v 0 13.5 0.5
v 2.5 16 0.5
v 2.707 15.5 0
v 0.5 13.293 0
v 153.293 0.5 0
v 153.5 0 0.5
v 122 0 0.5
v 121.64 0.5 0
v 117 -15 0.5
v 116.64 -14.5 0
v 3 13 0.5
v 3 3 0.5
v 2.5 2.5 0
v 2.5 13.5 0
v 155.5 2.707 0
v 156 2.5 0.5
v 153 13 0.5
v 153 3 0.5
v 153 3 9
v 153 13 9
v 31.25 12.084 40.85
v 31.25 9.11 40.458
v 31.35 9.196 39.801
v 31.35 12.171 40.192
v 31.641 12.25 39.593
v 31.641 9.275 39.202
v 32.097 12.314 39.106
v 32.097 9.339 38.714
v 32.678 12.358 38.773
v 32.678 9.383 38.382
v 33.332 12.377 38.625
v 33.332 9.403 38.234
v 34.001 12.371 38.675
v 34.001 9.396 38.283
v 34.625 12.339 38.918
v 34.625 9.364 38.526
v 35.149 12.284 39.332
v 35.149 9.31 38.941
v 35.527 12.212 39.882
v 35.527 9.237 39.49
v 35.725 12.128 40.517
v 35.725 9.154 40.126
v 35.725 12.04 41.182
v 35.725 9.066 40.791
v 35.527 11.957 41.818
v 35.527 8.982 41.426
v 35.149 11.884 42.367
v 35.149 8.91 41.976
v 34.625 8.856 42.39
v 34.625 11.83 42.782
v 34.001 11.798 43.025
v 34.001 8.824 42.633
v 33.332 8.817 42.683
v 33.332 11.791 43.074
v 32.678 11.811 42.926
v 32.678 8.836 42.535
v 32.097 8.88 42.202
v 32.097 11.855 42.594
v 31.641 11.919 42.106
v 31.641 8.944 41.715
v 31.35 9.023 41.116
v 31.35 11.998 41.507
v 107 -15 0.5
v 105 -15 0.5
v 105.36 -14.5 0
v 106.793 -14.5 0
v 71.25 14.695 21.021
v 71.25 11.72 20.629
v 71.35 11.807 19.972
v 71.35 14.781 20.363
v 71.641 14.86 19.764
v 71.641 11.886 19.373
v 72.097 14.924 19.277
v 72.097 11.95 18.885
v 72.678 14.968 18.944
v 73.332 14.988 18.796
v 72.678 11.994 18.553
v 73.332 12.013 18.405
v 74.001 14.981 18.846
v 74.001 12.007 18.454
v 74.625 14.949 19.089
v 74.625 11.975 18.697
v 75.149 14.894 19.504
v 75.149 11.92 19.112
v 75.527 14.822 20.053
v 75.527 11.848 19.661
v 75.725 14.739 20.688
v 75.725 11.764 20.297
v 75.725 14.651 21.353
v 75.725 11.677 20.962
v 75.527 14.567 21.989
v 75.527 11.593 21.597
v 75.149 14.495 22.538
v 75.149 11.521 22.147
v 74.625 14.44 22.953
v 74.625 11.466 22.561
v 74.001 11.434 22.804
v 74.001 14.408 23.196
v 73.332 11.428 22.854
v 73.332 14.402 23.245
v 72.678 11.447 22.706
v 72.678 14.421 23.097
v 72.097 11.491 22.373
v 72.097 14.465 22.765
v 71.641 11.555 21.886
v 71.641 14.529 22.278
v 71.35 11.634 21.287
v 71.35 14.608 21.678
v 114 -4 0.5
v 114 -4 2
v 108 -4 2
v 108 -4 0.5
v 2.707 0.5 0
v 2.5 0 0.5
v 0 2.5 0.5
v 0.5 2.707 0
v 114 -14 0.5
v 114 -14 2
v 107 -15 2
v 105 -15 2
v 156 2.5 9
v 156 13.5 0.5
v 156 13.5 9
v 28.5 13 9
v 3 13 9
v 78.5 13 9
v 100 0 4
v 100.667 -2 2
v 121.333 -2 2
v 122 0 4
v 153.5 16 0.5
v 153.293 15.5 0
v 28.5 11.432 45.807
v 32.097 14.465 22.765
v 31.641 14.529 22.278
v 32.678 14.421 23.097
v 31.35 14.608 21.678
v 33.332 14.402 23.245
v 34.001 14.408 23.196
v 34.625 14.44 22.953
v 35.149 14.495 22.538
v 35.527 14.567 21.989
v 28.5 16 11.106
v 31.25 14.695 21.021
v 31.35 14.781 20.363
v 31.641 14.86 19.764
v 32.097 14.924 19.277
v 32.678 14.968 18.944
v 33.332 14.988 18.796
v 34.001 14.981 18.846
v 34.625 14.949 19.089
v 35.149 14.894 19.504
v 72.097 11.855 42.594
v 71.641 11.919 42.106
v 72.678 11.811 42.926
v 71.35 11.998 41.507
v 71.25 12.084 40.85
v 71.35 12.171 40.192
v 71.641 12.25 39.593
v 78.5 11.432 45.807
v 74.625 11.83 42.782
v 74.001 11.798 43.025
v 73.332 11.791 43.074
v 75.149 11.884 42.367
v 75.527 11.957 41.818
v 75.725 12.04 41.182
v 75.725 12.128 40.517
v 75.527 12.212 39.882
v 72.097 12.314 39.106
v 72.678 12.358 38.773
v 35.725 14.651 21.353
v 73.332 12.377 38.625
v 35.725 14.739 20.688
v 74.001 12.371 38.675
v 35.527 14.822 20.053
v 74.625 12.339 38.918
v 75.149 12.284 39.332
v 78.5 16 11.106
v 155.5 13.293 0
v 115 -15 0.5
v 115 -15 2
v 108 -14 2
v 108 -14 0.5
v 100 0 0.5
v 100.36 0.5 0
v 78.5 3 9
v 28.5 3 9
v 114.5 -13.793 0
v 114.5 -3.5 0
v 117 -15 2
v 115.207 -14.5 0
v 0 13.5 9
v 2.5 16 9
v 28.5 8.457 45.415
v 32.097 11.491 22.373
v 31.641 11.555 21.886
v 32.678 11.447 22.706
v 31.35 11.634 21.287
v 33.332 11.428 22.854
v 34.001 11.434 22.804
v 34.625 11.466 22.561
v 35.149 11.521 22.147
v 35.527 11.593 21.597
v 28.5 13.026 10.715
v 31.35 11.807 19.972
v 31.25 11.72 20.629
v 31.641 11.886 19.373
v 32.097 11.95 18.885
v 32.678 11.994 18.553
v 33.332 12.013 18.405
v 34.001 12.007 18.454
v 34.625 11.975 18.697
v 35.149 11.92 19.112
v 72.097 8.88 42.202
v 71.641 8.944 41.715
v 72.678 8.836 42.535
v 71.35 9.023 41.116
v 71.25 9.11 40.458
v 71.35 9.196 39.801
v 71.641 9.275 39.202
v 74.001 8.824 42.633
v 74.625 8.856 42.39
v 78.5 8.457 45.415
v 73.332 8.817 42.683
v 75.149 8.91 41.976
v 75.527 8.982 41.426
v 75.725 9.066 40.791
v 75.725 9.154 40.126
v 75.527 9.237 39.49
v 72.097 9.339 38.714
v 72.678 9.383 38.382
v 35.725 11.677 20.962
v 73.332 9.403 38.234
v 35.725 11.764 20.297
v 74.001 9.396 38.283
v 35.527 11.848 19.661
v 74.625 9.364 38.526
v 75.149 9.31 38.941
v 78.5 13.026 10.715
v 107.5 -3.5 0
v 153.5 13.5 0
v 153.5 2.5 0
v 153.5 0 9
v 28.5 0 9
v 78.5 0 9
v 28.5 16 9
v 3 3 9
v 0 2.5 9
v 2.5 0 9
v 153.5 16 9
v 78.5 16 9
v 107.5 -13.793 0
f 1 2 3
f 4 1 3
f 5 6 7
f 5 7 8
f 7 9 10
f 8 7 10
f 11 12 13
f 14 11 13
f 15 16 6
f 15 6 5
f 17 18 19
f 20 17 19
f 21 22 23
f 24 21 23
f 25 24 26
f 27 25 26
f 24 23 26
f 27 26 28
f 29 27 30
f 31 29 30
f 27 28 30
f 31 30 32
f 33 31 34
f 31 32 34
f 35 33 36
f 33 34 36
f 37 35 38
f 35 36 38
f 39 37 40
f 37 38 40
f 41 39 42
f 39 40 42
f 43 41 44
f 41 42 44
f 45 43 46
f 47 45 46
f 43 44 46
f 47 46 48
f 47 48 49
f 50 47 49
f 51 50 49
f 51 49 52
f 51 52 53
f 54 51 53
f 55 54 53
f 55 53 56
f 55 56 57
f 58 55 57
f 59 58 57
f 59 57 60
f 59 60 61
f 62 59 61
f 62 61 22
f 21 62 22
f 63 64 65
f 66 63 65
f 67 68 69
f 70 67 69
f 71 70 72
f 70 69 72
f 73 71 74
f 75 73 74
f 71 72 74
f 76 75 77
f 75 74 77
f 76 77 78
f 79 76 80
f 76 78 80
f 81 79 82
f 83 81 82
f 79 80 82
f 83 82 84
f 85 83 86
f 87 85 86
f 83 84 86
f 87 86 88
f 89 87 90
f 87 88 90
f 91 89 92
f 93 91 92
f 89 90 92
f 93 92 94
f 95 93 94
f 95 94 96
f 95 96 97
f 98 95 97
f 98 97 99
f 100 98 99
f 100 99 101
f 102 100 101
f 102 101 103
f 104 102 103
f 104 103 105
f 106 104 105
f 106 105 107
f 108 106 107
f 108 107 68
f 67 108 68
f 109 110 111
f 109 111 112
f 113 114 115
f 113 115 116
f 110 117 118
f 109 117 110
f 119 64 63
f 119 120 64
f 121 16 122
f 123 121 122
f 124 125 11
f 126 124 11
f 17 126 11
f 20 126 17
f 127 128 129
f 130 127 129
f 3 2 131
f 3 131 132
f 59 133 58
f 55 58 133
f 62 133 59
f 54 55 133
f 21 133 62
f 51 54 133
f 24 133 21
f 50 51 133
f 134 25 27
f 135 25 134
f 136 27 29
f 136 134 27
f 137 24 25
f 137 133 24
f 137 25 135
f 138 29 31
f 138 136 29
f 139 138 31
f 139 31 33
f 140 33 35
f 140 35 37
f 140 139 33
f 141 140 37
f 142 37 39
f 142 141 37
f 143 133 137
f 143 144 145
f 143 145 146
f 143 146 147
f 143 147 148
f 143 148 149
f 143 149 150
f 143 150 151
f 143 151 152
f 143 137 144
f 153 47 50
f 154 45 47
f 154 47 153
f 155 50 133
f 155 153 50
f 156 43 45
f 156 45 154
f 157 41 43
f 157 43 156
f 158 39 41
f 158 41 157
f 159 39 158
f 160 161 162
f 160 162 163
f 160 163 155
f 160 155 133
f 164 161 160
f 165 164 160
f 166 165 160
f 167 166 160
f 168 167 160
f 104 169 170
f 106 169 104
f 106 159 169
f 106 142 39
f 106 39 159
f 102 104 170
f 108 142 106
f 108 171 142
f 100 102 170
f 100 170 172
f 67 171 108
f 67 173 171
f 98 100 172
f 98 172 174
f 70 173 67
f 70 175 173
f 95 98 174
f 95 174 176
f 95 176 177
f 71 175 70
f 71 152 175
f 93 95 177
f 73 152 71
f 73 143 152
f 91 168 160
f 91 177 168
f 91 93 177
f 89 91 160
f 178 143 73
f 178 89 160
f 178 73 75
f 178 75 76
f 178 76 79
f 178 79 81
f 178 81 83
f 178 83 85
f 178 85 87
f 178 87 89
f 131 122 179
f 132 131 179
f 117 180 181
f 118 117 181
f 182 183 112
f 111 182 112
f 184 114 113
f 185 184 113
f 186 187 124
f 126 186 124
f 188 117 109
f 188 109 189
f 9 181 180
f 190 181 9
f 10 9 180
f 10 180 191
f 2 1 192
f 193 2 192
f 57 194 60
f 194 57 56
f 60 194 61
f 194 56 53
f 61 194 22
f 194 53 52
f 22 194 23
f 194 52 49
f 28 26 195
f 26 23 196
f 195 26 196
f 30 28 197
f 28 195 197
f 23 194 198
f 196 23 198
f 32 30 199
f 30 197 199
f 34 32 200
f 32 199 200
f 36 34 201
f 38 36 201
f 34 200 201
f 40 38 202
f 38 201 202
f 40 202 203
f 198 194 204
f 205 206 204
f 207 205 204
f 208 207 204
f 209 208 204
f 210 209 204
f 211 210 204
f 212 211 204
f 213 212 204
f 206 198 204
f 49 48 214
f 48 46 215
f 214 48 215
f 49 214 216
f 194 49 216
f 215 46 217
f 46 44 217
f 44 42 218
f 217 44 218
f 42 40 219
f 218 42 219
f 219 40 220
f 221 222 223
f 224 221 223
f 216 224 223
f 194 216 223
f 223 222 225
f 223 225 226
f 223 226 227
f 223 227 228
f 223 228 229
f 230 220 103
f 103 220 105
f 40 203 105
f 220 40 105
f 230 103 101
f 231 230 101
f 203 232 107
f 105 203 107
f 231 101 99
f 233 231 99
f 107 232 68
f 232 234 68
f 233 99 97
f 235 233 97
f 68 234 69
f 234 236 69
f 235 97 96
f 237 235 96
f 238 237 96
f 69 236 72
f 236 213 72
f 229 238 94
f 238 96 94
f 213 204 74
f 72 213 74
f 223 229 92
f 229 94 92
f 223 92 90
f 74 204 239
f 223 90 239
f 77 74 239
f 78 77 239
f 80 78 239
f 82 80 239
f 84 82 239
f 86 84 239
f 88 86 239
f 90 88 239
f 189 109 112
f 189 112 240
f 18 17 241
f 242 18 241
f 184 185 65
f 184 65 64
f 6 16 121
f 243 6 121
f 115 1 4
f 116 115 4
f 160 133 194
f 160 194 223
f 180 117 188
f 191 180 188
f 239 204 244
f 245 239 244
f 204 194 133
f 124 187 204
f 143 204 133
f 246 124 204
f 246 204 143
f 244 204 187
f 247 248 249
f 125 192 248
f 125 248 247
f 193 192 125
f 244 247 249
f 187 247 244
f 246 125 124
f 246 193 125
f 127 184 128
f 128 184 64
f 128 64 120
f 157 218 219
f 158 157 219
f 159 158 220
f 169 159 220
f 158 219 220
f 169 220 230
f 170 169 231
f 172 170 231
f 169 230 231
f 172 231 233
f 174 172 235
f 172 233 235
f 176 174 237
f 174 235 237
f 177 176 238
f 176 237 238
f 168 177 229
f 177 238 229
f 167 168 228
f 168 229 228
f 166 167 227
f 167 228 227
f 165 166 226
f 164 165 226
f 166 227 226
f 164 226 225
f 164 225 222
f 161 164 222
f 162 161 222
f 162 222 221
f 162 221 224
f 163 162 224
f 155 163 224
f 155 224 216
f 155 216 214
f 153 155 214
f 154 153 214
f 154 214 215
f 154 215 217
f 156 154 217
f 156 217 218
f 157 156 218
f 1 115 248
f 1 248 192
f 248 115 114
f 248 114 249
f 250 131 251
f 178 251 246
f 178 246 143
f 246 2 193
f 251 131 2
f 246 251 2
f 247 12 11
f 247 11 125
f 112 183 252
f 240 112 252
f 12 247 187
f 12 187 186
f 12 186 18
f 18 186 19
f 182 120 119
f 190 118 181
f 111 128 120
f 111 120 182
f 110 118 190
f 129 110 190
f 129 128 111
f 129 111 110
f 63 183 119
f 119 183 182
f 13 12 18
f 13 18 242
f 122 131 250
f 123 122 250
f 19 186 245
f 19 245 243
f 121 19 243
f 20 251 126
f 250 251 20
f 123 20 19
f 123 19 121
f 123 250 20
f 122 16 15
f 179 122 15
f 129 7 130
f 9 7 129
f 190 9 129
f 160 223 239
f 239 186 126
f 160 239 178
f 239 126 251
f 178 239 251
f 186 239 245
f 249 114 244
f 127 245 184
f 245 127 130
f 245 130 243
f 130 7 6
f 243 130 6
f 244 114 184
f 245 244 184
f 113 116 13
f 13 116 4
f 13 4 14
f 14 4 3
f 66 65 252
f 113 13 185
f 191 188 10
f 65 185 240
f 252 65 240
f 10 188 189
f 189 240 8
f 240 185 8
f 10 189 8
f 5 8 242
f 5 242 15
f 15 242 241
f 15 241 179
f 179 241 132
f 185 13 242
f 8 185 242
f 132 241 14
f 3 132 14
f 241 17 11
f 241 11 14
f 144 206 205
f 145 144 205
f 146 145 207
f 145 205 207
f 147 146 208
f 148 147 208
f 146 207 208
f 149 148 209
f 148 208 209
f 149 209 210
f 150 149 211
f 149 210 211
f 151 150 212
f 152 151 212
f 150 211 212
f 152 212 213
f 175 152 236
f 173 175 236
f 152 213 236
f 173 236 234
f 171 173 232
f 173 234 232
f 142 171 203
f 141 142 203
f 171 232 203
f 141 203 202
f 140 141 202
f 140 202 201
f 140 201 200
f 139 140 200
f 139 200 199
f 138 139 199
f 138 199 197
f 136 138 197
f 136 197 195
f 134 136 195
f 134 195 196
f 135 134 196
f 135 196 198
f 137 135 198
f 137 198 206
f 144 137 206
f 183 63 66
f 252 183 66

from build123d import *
from OCP.BRepFilletAPI import BRepFilletAPI_MakeChamfer

# Parameters (mm, degrees)
SKETCH1_W            = 156
SKETCH1_H            = 16
BOSS_EXTRUDE1_DEPTH  = 9
SKETCH2_W            = 150
SKETCH2_H            = 10
CUT_EXTRUDE1_DEPTH   = 9
BOSS_EXTRUDE2_START  = -127.5
BOSS_EXTRUDE2_DEPTH  = 50
SKETCH5_W            = 50
SKETCH5_H            = 3
BOSS_EXTRUDE3_DEPTH  = 35
M4_CLEARANCE_HOLE1_D = 4.5
SKETCH10_W           = 12
SKETCH10_H           = 2
BOSS_EXTRUDE4_DEPTH  = 15
SKETCH11_W           = 6
SKETCH11_H           = 11
CUT_EXTRUDE2_DEPTH   = 15
CHAMFER1_SIZE        = 5
CHAMFER1_SIZE_2      = 15
CHAMFER2_SIZE        = 1
CHAMFER3_SIZE        = 2.5
CHAMFER4_SIZE        = 2
CHAMFER5_SIZE        = 0.5


# Some blends are built 0.0001 mm under size
with BuildPart() as part:
    # Sketch1 → Boss-Extrude1 (new body)
    with BuildSketch(Plane.XY):
        with Locations((78, 8)):
            Rectangle(SKETCH1_W, SKETCH1_H)
    extrude(amount=BOSS_EXTRUDE1_DEPTH)

    # Sketch2 → Cut-Extrude1 (cut)
    with BuildSketch(Plane.XY.offset(9)):
        with Locations((78, 8)):
            Rectangle(SKETCH2_W, SKETCH2_H)
    extrude(amount=-CUT_EXTRUDE1_DEPTH, mode=Mode.SUBTRACT)

    # Sketch4 → Boss-Extrude2 (add)
    with BuildSketch(Plane(origin=(156, 0, 0), x_dir=(0, 0, -1), z_dir=(1, 0, 0)).offset(BOSS_EXTRUDE2_START)):
        Polygon((-9, 16), (-11.106439961, 16), (-9, 0), align=None)
    extrude(amount=BOSS_EXTRUDE2_DEPTH)

    # Sketch5 → Boss-Extrude3 (add)
    with BuildSketch(Plane(origin=(0, -1.164685703, 8.846666218), x_dir=(1, 0, 0), z_dir=(0, -0.13052619222004497, 0.9914448613738114))):
        with Locations((53.5, 15.812799099)):
            Rectangle(SKETCH5_W, SKETCH5_H)
    extrude(amount=BOSS_EXTRUDE3_DEPTH)

    # M4 Clearance Hole1 (through all)
    with Locations(Plane(origin=(0, 17.164685703, 2.259773743), x_dir=(1, 0, 0), z_dir=(0, 0.9914448613738114, 0.130526192220045))):
        with Locations((33.5, -18.923003752), (73.5, -18.923003752), (73.5, -38.923003752), (33.5, -38.923003752)):
            Hole(M4_CLEARANCE_HOLE1_D / 2)

    # Sketch10 → Boss-Extrude4 (add)
    with BuildSketch(Plane.XZ):
        with Locations((111, 1)):
            Rectangle(SKETCH10_W, SKETCH10_H)
    extrude(amount=BOSS_EXTRUDE4_DEPTH)

    # Sketch11 → Cut-Extrude2 (cut)
    with BuildSketch(Plane(origin=(0, 0, 0), x_dir=(-1, 0, 0), z_dir=(0, 0, -1))):
        with Locations((-111, -9.5)):
            Rectangle(SKETCH11_W, SKETCH11_H)
    extrude(amount=-CUT_EXTRUDE2_DEPTH, mode=Mode.SUBTRACT)

    # Chamfer1
    chamfer1_edges_1 = [part.edges().sort_by_distance(p)[0] for p in [
        (117, 0, 1),
    ]]
    chamfer1_side_1 = [part.faces().sort_by_distance(p)[0] for p in [
        (117.1, 0, 1),
    ]]
    chamfer1_edges_2 = [part.edges().sort_by_distance(p)[0] for p in [
        (105, 0, 1),
    ]]
    chamfer1_side_2 = [part.faces().sort_by_distance(p)[0] for p in [
        (104.9, 0, 1),
    ]]
    chamfer1 = BRepFilletAPI_MakeChamfer(part.part.solid().wrapped)
    for e in chamfer1_edges_1:
        chamfer1.Add(CHAMFER1_SIZE - 0.0001, CHAMFER1_SIZE_2 - 0.0001, e.wrapped, chamfer1_side_1[0].wrapped)
    for e in chamfer1_edges_2:
        chamfer1.Add(CHAMFER1_SIZE - 0.0001, CHAMFER1_SIZE_2 - 0.0001, e.wrapped, chamfer1_side_2[0].wrapped)
    add(Compound.cast(chamfer1.Shape()), mode=Mode.REPLACE)  # a hair under: the kernel refuses the full size

    # Chamfer2
    chamfer2_edges = [part.edges().sort_by_distance(p)[0] for p in [
        (108, -15, 1),
        (114, -15, 1),
    ]]
    chamfer(chamfer2_edges, length=CHAMFER2_SIZE)

    # Chamfer3
    chamfer3_edges = [part.edges().sort_by_distance(p)[0] for p in [
        (0, 16, 4.5),
        (156, 16, 4.5),
        (156, 0, 4.5),
        (0, 0, 4.5),
    ]]
    chamfer(chamfer3_edges, length=CHAMFER3_SIZE)

    # Chamfer4
    chamfer4_edges = [part.edges().sort_by_distance(p)[0] for p in [
        (111, 0, 2),
    ]]
    chamfer(chamfer4_edges, length=CHAMFER4_SIZE)

    # Chamfer5
    # the kernel refuses this chamfer: 0.5 mm, written as the material it takes off along each edge
    with BuildSketch(Plane(origin=(114, -4, 0), x_dir=(-0.027495876610582174, 0, 0.9996219169112968), z_dir=(0, -1, 0)), Plane(origin=(108, -15.285841494, 0), x_dir=(0.027495876610582174, 0, 0.9996219169112968), z_dir=(0, 1, 0))) as chamfer5_piece_1:
        Polygon((CHAMFER5_SIZE * 0.999621916911, -CHAMFER5_SIZE * 0.0274958766106), (-CHAMFER5_SIZE * 0.0274958766106, -CHAMFER5_SIZE * 0.999621916911), (0, 0), align=None)
    extrude(amount=11.285841494, mode=Mode.SUBTRACT)
    with BuildSketch(Plane(origin=(108, -4, 0), x_dir=(0, -0.02749587661058563, 0.9996219169112968), z_dir=(1, 0, 0))) as chamfer5_piece_2:
        Polygon((CHAMFER5_SIZE * 0.999621916911, -CHAMFER5_SIZE * 0.0274958766106), (-CHAMFER5_SIZE * 0.0274958766106, -CHAMFER5_SIZE * 0.999621916911), (0, 0), align=None)
    extrude(amount=6, mode=Mode.SUBTRACT)
    with BuildSketch(Plane(origin=(120.714058506, 0, 0), x_dir=(0, -0.027495876610586372, 0.9996219169112968), z_dir=(1, 0, 0))) as chamfer5_piece_3_section:
        Polygon((CHAMFER5_SIZE * 0.999621916911, -CHAMFER5_SIZE * 0.0274958766106), (-CHAMFER5_SIZE * 0.0274958766106, -CHAMFER5_SIZE * 0.999621916911), (0, 0), align=None)
    chamfer5_piece_3 = extrude(amount=34.071782988, mode=Mode.PRIVATE)
    chamfer5_piece_3 = split(chamfer5_piece_3, bisect_by=Plane(origin=(123.691323229, 5.074337344, 0.164983246), z_dir=(0.9486845629641077, -0.31622397125075763, 0)), keep=Keep.TOP, mode=Mode.PRIVATE)
    add(chamfer5_piece_3, mode=Mode.SUBTRACT)
    with BuildSketch(Plane(origin=(122.406513904, 1.219857976, 0), x_dir=(0.026084913685623757, -0.008694855294818641, 0.999621916911297), z_dir=(-0.31622397125075763, -0.9486845629641077, 0))) as chamfer5_piece_4_section:
        Polygon((CHAMFER5_SIZE * 0.999621916911, CHAMFER5_SIZE * 0.0274958766106), (-CHAMFER5_SIZE * 0.0274958766106, CHAMFER5_SIZE * 0.999621916911), (0, 0), align=None)
    chamfer5_piece_4 = extrude(amount=18.382944798, mode=Mode.PRIVATE)
    chamfer5_piece_4 = split(chamfer5_piece_4, bisect_by=Plane(origin=(119.414869386, 0, 0.166750545), z_dir=(0, -1, 0)), keep=Keep.TOP, mode=Mode.PRIVATE)
    add(chamfer5_piece_4, mode=Mode.SUBTRACT)
    with BuildSketch(Plane(origin=(99.593486096, 1.219857976, 0), x_dir=(0.948325881374337, 0.31610441231498504, -0.027495876610587087), z_dir=(0.31622397125075763, -0.9486845629641077, 0))) as chamfer5_piece_5_section:
        Polygon((CHAMFER5_SIZE * 0.999621916911, CHAMFER5_SIZE * 0.0274958766106), (-CHAMFER5_SIZE * 0.0274958766106, CHAMFER5_SIZE * 0.999621916911), (0, 0), align=None)
    chamfer5_piece_5 = extrude(amount=18.382944798, mode=Mode.PRIVATE)
    chamfer5_piece_5 = split(chamfer5_piece_5, bisect_by=Plane(origin=(102.585130614, 0, 0.166750545), z_dir=(0, -1, 0)), keep=Keep.TOP, mode=Mode.PRIVATE)
    add(chamfer5_piece_5, mode=Mode.SUBTRACT)
    with BuildSketch(Plane(origin=(118.285841494, -15, 0), x_dir=(0, -0.02749587661058563, 0.9996219169112968), z_dir=(-1, 0, 0)), Plane(origin=(108.285841494, -15, 0), x_dir=(0, -0.02749587661058563, 0.9996219169112968), z_dir=(-1, 0, 0))) as chamfer5_piece_6:
        Polygon((CHAMFER5_SIZE * 0.999621916911, CHAMFER5_SIZE * 0.0274958766106), (-CHAMFER5_SIZE * 0.0274958766106, CHAMFER5_SIZE * 0.999621916911), (0, 0), align=None)
    extrude(amount=4.571682988, mode=Mode.SUBTRACT)
    with BuildSketch(Plane(origin=(113.09077276, -13.09077276, 0), x_dir=(-0.01944252080601897, -0.01944252080601897, 0.9996219169112965), z_dir=(0.7071067811865476, -0.7071067811865476, 0)), Plane(origin=(106.09077276, -15.90922724, 0), x_dir=(0.019442520806029328, -0.019442520806029328, 0.9996219169112961), z_dir=(0.7071067811865476, 0.7071067811865476, 0))) as chamfer5_piece_7:
        Polygon((CHAMFER5_SIZE * 0.999621916911, -CHAMFER5_SIZE * 0.0274958766106), (-CHAMFER5_SIZE * 0.0274958766106, -CHAMFER5_SIZE * 0.999621916911), (0, 0), align=None)
    extrude(amount=3.98589655, mode=Mode.SUBTRACT)
    with BuildSketch(Plane(origin=(1.214158506, 0, 0), x_dir=(0, -0.027495876610586372, 0.9996219169112968), z_dir=(1, 0, 0))) as chamfer5_piece_8_section:
        Polygon((CHAMFER5_SIZE * 0.999621916911, -CHAMFER5_SIZE * 0.0274958766106), (-CHAMFER5_SIZE * 0.0274958766106, -CHAMFER5_SIZE * 0.999621916911), (0, 0), align=None)
    chamfer5_piece_8 = extrude(amount=100.071782988, mode=Mode.PRIVATE)
    chamfer5_piece_8 = split(chamfer5_piece_8, bisect_by=Plane(origin=(95.008721747, 14.974334417, 0.164925467), z_dir=(-0.9486845629641077, -0.31622397125075763, 0)), keep=Keep.TOP, mode=Mode.PRIVATE)
    add(chamfer5_piece_8, mode=Mode.SUBTRACT)
    with BuildSketch(Plane(origin=(0, 14.785841494, 0), x_dir=(-0.027495876610586372, 0, 0.9996219169112968), z_dir=(0, -1, 0)), Plane(origin=(156, 1.214158506, 0), x_dir=(0.027495876610582174, 0, 0.9996219169112968), z_dir=(0, 1, 0))) as chamfer5_piece_9:
        Polygon((CHAMFER5_SIZE * 0.999621916911, -CHAMFER5_SIZE * 0.0274958766106), (-CHAMFER5_SIZE * 0.0274958766106, -CHAMFER5_SIZE * 0.999621916911), (0, 0), align=None)
    extrude(amount=13.571682988, mode=Mode.SUBTRACT)
    with BuildSketch(Plane(origin=(154.785841494, 16, 0), x_dir=(0, 0.02749587661058908, 0.9996219169112968), z_dir=(-1, 0, 0))) as chamfer5_piece_10:
        Polygon((CHAMFER5_SIZE * 0.999621916911, -CHAMFER5_SIZE * 0.0274958766106), (-CHAMFER5_SIZE * 0.0274958766106, -CHAMFER5_SIZE * 0.999621916911), (0, 0), align=None)
    extrude(amount=153.571682988, mode=Mode.SUBTRACT)
    with BuildSketch(Plane(origin=(152.59077276, -0.90922724, 0), x_dir=(0.01944252080600009, -0.01944252080600009, 0.9996219169112972), z_dir=(0.7071067811865476, 0.7071067811865476, 0)), Plane(origin=(156.90922724, 12.59077276, 0), x_dir=(0.019442520806003442, 0.019442520806003442, 0.9996219169112972), z_dir=(-0.7071067811865476, 0.7071067811865476, 0)), Plane(origin=(3.40922724, 16.90922724, 0), x_dir=(-0.01944252080601509, 0.01944252080601509, 0.9996219169112968), z_dir=(-0.7071067811865476, -0.7071067811865476, 0))) as chamfer5_piece_11:
        Polygon((CHAMFER5_SIZE * 0.999621916911, -CHAMFER5_SIZE * 0.0274958766106), (-CHAMFER5_SIZE * 0.0274958766106, -CHAMFER5_SIZE * 0.999621916911), (0, 0), align=None)
    extrude(amount=6.107216894, mode=Mode.SUBTRACT)
    with BuildSketch(Plane(origin=(3.40922724, -0.90922724, 0), x_dir=(-0.019442520806014007, -0.019442520806014007, 0.9996219169112968), z_dir=(-0.7071067811865476, 0.7071067811865476, 0))) as chamfer5_piece_12:
        Polygon((CHAMFER5_SIZE * 0.999621916911, CHAMFER5_SIZE * 0.0274958766106), (-CHAMFER5_SIZE * 0.0274958766106, CHAMFER5_SIZE * 0.999621916911), (0, 0), align=None)
    extrude(amount=6.107216894, mode=Mode.SUBTRACT)
    with BuildSketch(Plane(origin=(3, 3, 0), x_dir=(0, 0.027495876610586494, 0.9996219169112968), z_dir=(1, 0, 0)), Plane(origin=(153, 13, 0), x_dir=(0, -0.02749587661058563, 0.9996219169112968), z_dir=(-1, 0, 0))) as chamfer5_piece_13:
        Polygon((CHAMFER5_SIZE * 0.999621916911, CHAMFER5_SIZE * 0.0274958766106), (-CHAMFER5_SIZE * 0.0274958766106, CHAMFER5_SIZE * 0.999621916911), (0, 0), align=None)
    extrude(amount=150, mode=Mode.SUBTRACT)
    with BuildSketch(Plane(origin=(3, 13, 0), x_dir=(0.027495876610586494, 0, 0.9996219169112968), z_dir=(0, -1, 0)), Plane(origin=(153, 3, 0), x_dir=(-0.027495876610582174, 0, 0.9996219169112968), z_dir=(0, 1, 0))) as chamfer5_piece_14:
        Polygon((CHAMFER5_SIZE * 0.999621916911, CHAMFER5_SIZE * 0.0274958766106), (-CHAMFER5_SIZE * 0.0274958766106, CHAMFER5_SIZE * 0.999621916911), (0, 0), align=None)
    extrude(amount=10, mode=Mode.SUBTRACT)
    with BuildSketch(Plane(origin=(114, -2.714158506, 0), x_dir=(-0.027495876610582174, 0, 0.9996219169112968), z_dir=(0, -1, 0))) as chamfer5_piece_15a_section:
        Polygon((CHAMFER5_SIZE * 0.999621916911, -CHAMFER5_SIZE * 0.0274958766106), (-CHAMFER5_SIZE * 0.0274958766106, -CHAMFER5_SIZE * 0.999621916911), (0, 0), align=None)
    chamfer5_piece_15a = extrude(amount=12.571682988, mode=Mode.PRIVATE)
    chamfer5_piece_15a = split(chamfer5_piece_15a, bisect_by=Plane(origin=(114.164896813, -4, 0.164896813), z_dir=(0, 1, 0)), keep=Keep.TOP, mode=Mode.PRIVATE)
    with BuildSketch(Plane(origin=(108, -4, 0), x_dir=(0, -0.02749587661058563, 0.9996219169112968), z_dir=(1, 0, 0))) as chamfer5_piece_15b_section:
        Polygon((CHAMFER5_SIZE * 0.999621916911, -CHAMFER5_SIZE * 0.0274958766106), (-CHAMFER5_SIZE * 0.0274958766106, -CHAMFER5_SIZE * 0.999621916911), (0, 0), align=None)
    chamfer5_piece_15b = extrude(amount=7.285841494, mode=Mode.PRIVATE)
    chamfer5_piece_15b = split(chamfer5_piece_15b, bisect_by=Plane(origin=(114, -3.835103187, 0.164896813), z_dir=(1, 0, 0)), keep=Keep.TOP, mode=Mode.PRIVATE)
    chamfer5_piece_15 = chamfer5_piece_15a & chamfer5_piece_15b
    add(chamfer5_piece_15, mode=Mode.SUBTRACT)
    with BuildSketch(Plane(origin=(106.714158506, -4, 0), x_dir=(0, -0.02749587661058563, 0.9996219169112968), z_dir=(1, 0, 0))) as chamfer5_piece_16a_section:
        Polygon((CHAMFER5_SIZE * 0.999621916911, -CHAMFER5_SIZE * 0.0274958766106), (-CHAMFER5_SIZE * 0.0274958766106, -CHAMFER5_SIZE * 0.999621916911), (0, 0), align=None)
    chamfer5_piece_16a = extrude(amount=7.285841494, mode=Mode.PRIVATE)
    chamfer5_piece_16a = split(chamfer5_piece_16a, bisect_by=Plane(origin=(108, -3.835103187, 0.164896813), z_dir=(-1, 0, 0)), keep=Keep.TOP, mode=Mode.PRIVATE)
    with BuildSketch(Plane(origin=(108, -15.285841494, 0), x_dir=(0.027495876610582174, 0, 0.9996219169112968), z_dir=(0, 1, 0))) as chamfer5_piece_16b_section:
        Polygon((CHAMFER5_SIZE * 0.999621916911, -CHAMFER5_SIZE * 0.0274958766106), (-CHAMFER5_SIZE * 0.0274958766106, -CHAMFER5_SIZE * 0.999621916911), (0, 0), align=None)
    chamfer5_piece_16b = extrude(amount=12.571682988, mode=Mode.PRIVATE)
    chamfer5_piece_16b = split(chamfer5_piece_16b, bisect_by=Plane(origin=(107.835103187, -4, 0.164896813), z_dir=(0, 1, 0)), keep=Keep.TOP, mode=Mode.PRIVATE)
    chamfer5_piece_16 = chamfer5_piece_16a & chamfer5_piece_16b
    add(chamfer5_piece_16, mode=Mode.SUBTRACT)
    with BuildSketch(Plane(origin=(120.714058506, 0, 0), x_dir=(0, -0.027495876610586372, 0.9996219169112968), z_dir=(1, 0, 0))) as chamfer5_piece_17a_section:
        Polygon((CHAMFER5_SIZE * 0.999621916911, -CHAMFER5_SIZE * 0.0274958766106), (-CHAMFER5_SIZE * 0.0274958766106, -CHAMFER5_SIZE * 0.999621916911), (0, 0), align=None)
    chamfer5_piece_17a = extrude(amount=34.071782988, mode=Mode.PRIVATE)
    chamfer5_piece_17a = split(chamfer5_piece_17a, bisect_by=Plane(origin=(121.989075947, -0.032472593, 0.162786872), z_dir=(-0.9486845629641077, 0.31622397125075763, 0)), keep=Keep.TOP, mode=Mode.PRIVATE)
    with BuildSketch(Plane(origin=(122.406513904, 1.219857976, 0), x_dir=(0.026084913685623757, -0.008694855294818641, 0.999621916911297), z_dir=(-0.31622397125075763, -0.9486845629641077, 0))) as chamfer5_piece_17b_section:
        Polygon((CHAMFER5_SIZE * 0.999621916911, CHAMFER5_SIZE * 0.0274958766106), (-CHAMFER5_SIZE * 0.0274958766106, CHAMFER5_SIZE * 0.999621916911), (0, 0), align=None)
    chamfer5_piece_17b = extrude(amount=18.382944798, mode=Mode.PRIVATE)
    chamfer5_piece_17b = split(chamfer5_piece_17b, bisect_by=Plane(origin=(122.034129073, 0, 0.162786872), z_dir=(0, 1, 0)), keep=Keep.TOP, mode=Mode.PRIVATE)
    chamfer5_piece_17 = chamfer5_piece_17a & chamfer5_piece_17b
    add(chamfer5_piece_17, mode=Mode.SUBTRACT)
    with BuildSketch(Plane(origin=(1.214158506, 0, 0), x_dir=(0, -0.027495876610586372, 0.9996219169112968), z_dir=(1, 0, 0))) as chamfer5_piece_18a_section:
        Polygon((CHAMFER5_SIZE * 0.999621916911, -CHAMFER5_SIZE * 0.0274958766106), (-CHAMFER5_SIZE * 0.0274958766106, -CHAMFER5_SIZE * 0.999621916911), (0, 0), align=None)
    chamfer5_piece_18a = extrude(amount=100.071782988, mode=Mode.PRIVATE)
    chamfer5_piece_18a = split(chamfer5_piece_18a, bisect_by=Plane(origin=(100.010924053, -0.032472593, 0.162786872), z_dir=(0.9486845629641077, 0.31622397125075763, 0)), keep=Keep.TOP, mode=Mode.PRIVATE)
    with BuildSketch(Plane(origin=(99.593486096, 1.219857976, 0), x_dir=(0.948325881374337, 0.31610441231498504, -0.027495876610587087), z_dir=(0.31622397125075763, -0.9486845629641077, 0))) as chamfer5_piece_18b_section:
        Polygon((CHAMFER5_SIZE * 0.999621916911, CHAMFER5_SIZE * 0.0274958766106), (-CHAMFER5_SIZE * 0.0274958766106, CHAMFER5_SIZE * 0.999621916911), (0, 0), align=None)
    chamfer5_piece_18b = extrude(amount=18.382944798, mode=Mode.PRIVATE)
    chamfer5_piece_18b = split(chamfer5_piece_18b, bisect_by=Plane(origin=(99.965870927, 0, 0.162786872), z_dir=(0, 1, 0)), keep=Keep.TOP, mode=Mode.PRIVATE)
    chamfer5_piece_18 = chamfer5_piece_18a & chamfer5_piece_18b
    add(chamfer5_piece_18, mode=Mode.SUBTRACT)
    with BuildSketch(Plane(origin=(1.714158506, 3, 0), x_dir=(0, 0.027495876610586494, 0.9996219169112968), z_dir=(1, 0, 0))) as chamfer5_piece_19a_section:
        Polygon((CHAMFER5_SIZE * 0.999621916911, CHAMFER5_SIZE * 0.0274958766106), (-CHAMFER5_SIZE * 0.0274958766106, CHAMFER5_SIZE * 0.999621916911), (0, 0), align=None)
    chamfer5_piece_19a = extrude(amount=151.285841494, mode=Mode.PRIVATE)
    chamfer5_piece_19a = split(chamfer5_piece_19a, bisect_by=Plane(origin=(3, 2.835103187, 0.164896813), z_dir=(-1, 0, 0)), keep=Keep.TOP, mode=Mode.PRIVATE)
    with BuildSketch(Plane(origin=(3, 13, 0), x_dir=(0.027495876610586494, 0, 0.9996219169112968), z_dir=(0, -1, 0))) as chamfer5_piece_19b_section:
        Polygon((CHAMFER5_SIZE * 0.999621916911, CHAMFER5_SIZE * 0.0274958766106), (-CHAMFER5_SIZE * 0.0274958766106, CHAMFER5_SIZE * 0.999621916911), (0, 0), align=None)
    chamfer5_piece_19b = extrude(amount=11.285841494, mode=Mode.PRIVATE)
    chamfer5_piece_19b = split(chamfer5_piece_19b, bisect_by=Plane(origin=(2.835103187, 3, 0.164896813), z_dir=(0, -1, 0)), keep=Keep.TOP, mode=Mode.PRIVATE)
    chamfer5_piece_19 = chamfer5_piece_19a & chamfer5_piece_19b
    add(chamfer5_piece_19, mode=Mode.SUBTRACT)
    with BuildSketch(Plane(origin=(3, 3, 0), x_dir=(0, 0.027495876610586494, 0.9996219169112968), z_dir=(1, 0, 0))) as chamfer5_piece_20a_section:
        Polygon((CHAMFER5_SIZE * 0.999621916911, CHAMFER5_SIZE * 0.0274958766106), (-CHAMFER5_SIZE * 0.0274958766106, CHAMFER5_SIZE * 0.999621916911), (0, 0), align=None)
    chamfer5_piece_20a = extrude(amount=151.285841494, mode=Mode.PRIVATE)
    chamfer5_piece_20a = split(chamfer5_piece_20a, bisect_by=Plane(origin=(153, 2.835103187, 0.164896813), z_dir=(1, 0, 0)), keep=Keep.TOP, mode=Mode.PRIVATE)
    with BuildSketch(Plane(origin=(153, 1.714158506, 0), x_dir=(-0.027495876610582174, 0, 0.9996219169112968), z_dir=(0, 1, 0))) as chamfer5_piece_20b_section:
        Polygon((CHAMFER5_SIZE * 0.999621916911, CHAMFER5_SIZE * 0.0274958766106), (-CHAMFER5_SIZE * 0.0274958766106, CHAMFER5_SIZE * 0.999621916911), (0, 0), align=None)
    chamfer5_piece_20b = extrude(amount=11.285841494, mode=Mode.PRIVATE)
    chamfer5_piece_20b = split(chamfer5_piece_20b, bisect_by=Plane(origin=(153.164896813, 3, 0.164896813), z_dir=(0, -1, 0)), keep=Keep.TOP, mode=Mode.PRIVATE)
    chamfer5_piece_20 = chamfer5_piece_20a & chamfer5_piece_20b
    add(chamfer5_piece_20, mode=Mode.SUBTRACT)
    with BuildSketch(Plane(origin=(3, 14.285841494, 0), x_dir=(0.027495876610586494, 0, 0.9996219169112968), z_dir=(0, -1, 0))) as chamfer5_piece_21a_section:
        Polygon((CHAMFER5_SIZE * 0.999621916911, CHAMFER5_SIZE * 0.0274958766106), (-CHAMFER5_SIZE * 0.0274958766106, CHAMFER5_SIZE * 0.999621916911), (0, 0), align=None)
    chamfer5_piece_21a = extrude(amount=11.285841494, mode=Mode.PRIVATE)
    chamfer5_piece_21a = split(chamfer5_piece_21a, bisect_by=Plane(origin=(2.835103187, 13, 0.164896813), z_dir=(0, 1, 0)), keep=Keep.TOP, mode=Mode.PRIVATE)
    with BuildSketch(Plane(origin=(153, 13, 0), x_dir=(0, -0.02749587661058563, 0.9996219169112968), z_dir=(-1, 0, 0))) as chamfer5_piece_21b_section:
        Polygon((CHAMFER5_SIZE * 0.999621916911, CHAMFER5_SIZE * 0.0274958766106), (-CHAMFER5_SIZE * 0.0274958766106, CHAMFER5_SIZE * 0.999621916911), (0, 0), align=None)
    chamfer5_piece_21b = extrude(amount=151.285841494, mode=Mode.PRIVATE)
    chamfer5_piece_21b = split(chamfer5_piece_21b, bisect_by=Plane(origin=(3, 13.164896813, 0.164896813), z_dir=(-1, 0, 0)), keep=Keep.TOP, mode=Mode.PRIVATE)
    chamfer5_piece_21 = chamfer5_piece_21a & chamfer5_piece_21b
    add(chamfer5_piece_21, mode=Mode.SUBTRACT)
    with BuildSketch(Plane(origin=(153, 3, 0), x_dir=(-0.027495876610582174, 0, 0.9996219169112968), z_dir=(0, 1, 0))) as chamfer5_piece_22a_section:
        Polygon((CHAMFER5_SIZE * 0.999621916911, CHAMFER5_SIZE * 0.0274958766106), (-CHAMFER5_SIZE * 0.0274958766106, CHAMFER5_SIZE * 0.999621916911), (0, 0), align=None)
    chamfer5_piece_22a = extrude(amount=11.285841494, mode=Mode.PRIVATE)
    chamfer5_piece_22a = split(chamfer5_piece_22a, bisect_by=Plane(origin=(153.164896813, 13, 0.164896813), z_dir=(0, 1, 0)), keep=Keep.TOP, mode=Mode.PRIVATE)
    with BuildSketch(Plane(origin=(154.285841494, 13, 0), x_dir=(0, -0.02749587661058563, 0.9996219169112968), z_dir=(-1, 0, 0))) as chamfer5_piece_22b_section:
        Polygon((CHAMFER5_SIZE * 0.999621916911, CHAMFER5_SIZE * 0.0274958766106), (-CHAMFER5_SIZE * 0.0274958766106, CHAMFER5_SIZE * 0.999621916911), (0, 0), align=None)
    chamfer5_piece_22b = extrude(amount=151.285841494, mode=Mode.PRIVATE)
    chamfer5_piece_22b = split(chamfer5_piece_22b, bisect_by=Plane(origin=(153, 13.164896813, 0.164896813), z_dir=(1, 0, 0)), keep=Keep.TOP, mode=Mode.PRIVATE)
    chamfer5_piece_22 = chamfer5_piece_22a & chamfer5_piece_22b
    add(chamfer5_piece_22, mode=Mode.SUBTRACT)


solid = part.part
